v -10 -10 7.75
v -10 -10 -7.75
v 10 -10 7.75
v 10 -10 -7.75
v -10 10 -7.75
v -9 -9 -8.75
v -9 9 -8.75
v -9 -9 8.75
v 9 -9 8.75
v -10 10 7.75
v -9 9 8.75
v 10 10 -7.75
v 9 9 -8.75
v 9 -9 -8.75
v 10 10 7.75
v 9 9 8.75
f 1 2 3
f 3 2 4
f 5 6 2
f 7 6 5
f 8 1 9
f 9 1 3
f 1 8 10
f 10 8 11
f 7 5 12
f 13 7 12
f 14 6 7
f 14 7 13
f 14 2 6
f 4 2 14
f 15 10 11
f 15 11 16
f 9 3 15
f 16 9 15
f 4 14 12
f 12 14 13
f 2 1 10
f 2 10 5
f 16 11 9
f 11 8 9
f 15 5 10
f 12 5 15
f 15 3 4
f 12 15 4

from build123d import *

# Parameters (mm, degrees)
BOSS_EXTRUDE1_DEPTH      = 10
BOSS_EXTRUDE1_DEPTH_BACK = 10
SKETCH1_W                = 20
SKETCH1_H                = 17.5
CHAMFER2_SIZE            = 1


with BuildPart() as part:
    # Sketch1 → Boss-Extrude1 (new, two sides: drawn at the far end of the back side and taken through both)
    with BuildSketch(Plane(origin=(0, 0, 0), x_dir=(1, 0, 0), z_dir=(0, 1, 0)).offset(-BOSS_EXTRUDE1_DEPTH_BACK)):
        Rectangle(SKETCH1_W, SKETCH1_H)
    extrude(amount=BOSS_EXTRUDE1_DEPTH + BOSS_EXTRUDE1_DEPTH_BACK)

    # Chamfer2
    chamfer2_edges = [part.edges().sort_by_distance(p)[0] for p in [
        (0, 10, 8.75),
        (0, -10, -8.75),
        (0, 10, -8.75),
        (0, -10, 8.75),
        (-10, 0, -8.75),
        (10, 0, -8.75),
        (10, 0, 8.75),
        (-10, 0, 8.75),
    ]]
    chamfer(chamfer2_edges, length=CHAMFER2_SIZE)


solid = part.part
